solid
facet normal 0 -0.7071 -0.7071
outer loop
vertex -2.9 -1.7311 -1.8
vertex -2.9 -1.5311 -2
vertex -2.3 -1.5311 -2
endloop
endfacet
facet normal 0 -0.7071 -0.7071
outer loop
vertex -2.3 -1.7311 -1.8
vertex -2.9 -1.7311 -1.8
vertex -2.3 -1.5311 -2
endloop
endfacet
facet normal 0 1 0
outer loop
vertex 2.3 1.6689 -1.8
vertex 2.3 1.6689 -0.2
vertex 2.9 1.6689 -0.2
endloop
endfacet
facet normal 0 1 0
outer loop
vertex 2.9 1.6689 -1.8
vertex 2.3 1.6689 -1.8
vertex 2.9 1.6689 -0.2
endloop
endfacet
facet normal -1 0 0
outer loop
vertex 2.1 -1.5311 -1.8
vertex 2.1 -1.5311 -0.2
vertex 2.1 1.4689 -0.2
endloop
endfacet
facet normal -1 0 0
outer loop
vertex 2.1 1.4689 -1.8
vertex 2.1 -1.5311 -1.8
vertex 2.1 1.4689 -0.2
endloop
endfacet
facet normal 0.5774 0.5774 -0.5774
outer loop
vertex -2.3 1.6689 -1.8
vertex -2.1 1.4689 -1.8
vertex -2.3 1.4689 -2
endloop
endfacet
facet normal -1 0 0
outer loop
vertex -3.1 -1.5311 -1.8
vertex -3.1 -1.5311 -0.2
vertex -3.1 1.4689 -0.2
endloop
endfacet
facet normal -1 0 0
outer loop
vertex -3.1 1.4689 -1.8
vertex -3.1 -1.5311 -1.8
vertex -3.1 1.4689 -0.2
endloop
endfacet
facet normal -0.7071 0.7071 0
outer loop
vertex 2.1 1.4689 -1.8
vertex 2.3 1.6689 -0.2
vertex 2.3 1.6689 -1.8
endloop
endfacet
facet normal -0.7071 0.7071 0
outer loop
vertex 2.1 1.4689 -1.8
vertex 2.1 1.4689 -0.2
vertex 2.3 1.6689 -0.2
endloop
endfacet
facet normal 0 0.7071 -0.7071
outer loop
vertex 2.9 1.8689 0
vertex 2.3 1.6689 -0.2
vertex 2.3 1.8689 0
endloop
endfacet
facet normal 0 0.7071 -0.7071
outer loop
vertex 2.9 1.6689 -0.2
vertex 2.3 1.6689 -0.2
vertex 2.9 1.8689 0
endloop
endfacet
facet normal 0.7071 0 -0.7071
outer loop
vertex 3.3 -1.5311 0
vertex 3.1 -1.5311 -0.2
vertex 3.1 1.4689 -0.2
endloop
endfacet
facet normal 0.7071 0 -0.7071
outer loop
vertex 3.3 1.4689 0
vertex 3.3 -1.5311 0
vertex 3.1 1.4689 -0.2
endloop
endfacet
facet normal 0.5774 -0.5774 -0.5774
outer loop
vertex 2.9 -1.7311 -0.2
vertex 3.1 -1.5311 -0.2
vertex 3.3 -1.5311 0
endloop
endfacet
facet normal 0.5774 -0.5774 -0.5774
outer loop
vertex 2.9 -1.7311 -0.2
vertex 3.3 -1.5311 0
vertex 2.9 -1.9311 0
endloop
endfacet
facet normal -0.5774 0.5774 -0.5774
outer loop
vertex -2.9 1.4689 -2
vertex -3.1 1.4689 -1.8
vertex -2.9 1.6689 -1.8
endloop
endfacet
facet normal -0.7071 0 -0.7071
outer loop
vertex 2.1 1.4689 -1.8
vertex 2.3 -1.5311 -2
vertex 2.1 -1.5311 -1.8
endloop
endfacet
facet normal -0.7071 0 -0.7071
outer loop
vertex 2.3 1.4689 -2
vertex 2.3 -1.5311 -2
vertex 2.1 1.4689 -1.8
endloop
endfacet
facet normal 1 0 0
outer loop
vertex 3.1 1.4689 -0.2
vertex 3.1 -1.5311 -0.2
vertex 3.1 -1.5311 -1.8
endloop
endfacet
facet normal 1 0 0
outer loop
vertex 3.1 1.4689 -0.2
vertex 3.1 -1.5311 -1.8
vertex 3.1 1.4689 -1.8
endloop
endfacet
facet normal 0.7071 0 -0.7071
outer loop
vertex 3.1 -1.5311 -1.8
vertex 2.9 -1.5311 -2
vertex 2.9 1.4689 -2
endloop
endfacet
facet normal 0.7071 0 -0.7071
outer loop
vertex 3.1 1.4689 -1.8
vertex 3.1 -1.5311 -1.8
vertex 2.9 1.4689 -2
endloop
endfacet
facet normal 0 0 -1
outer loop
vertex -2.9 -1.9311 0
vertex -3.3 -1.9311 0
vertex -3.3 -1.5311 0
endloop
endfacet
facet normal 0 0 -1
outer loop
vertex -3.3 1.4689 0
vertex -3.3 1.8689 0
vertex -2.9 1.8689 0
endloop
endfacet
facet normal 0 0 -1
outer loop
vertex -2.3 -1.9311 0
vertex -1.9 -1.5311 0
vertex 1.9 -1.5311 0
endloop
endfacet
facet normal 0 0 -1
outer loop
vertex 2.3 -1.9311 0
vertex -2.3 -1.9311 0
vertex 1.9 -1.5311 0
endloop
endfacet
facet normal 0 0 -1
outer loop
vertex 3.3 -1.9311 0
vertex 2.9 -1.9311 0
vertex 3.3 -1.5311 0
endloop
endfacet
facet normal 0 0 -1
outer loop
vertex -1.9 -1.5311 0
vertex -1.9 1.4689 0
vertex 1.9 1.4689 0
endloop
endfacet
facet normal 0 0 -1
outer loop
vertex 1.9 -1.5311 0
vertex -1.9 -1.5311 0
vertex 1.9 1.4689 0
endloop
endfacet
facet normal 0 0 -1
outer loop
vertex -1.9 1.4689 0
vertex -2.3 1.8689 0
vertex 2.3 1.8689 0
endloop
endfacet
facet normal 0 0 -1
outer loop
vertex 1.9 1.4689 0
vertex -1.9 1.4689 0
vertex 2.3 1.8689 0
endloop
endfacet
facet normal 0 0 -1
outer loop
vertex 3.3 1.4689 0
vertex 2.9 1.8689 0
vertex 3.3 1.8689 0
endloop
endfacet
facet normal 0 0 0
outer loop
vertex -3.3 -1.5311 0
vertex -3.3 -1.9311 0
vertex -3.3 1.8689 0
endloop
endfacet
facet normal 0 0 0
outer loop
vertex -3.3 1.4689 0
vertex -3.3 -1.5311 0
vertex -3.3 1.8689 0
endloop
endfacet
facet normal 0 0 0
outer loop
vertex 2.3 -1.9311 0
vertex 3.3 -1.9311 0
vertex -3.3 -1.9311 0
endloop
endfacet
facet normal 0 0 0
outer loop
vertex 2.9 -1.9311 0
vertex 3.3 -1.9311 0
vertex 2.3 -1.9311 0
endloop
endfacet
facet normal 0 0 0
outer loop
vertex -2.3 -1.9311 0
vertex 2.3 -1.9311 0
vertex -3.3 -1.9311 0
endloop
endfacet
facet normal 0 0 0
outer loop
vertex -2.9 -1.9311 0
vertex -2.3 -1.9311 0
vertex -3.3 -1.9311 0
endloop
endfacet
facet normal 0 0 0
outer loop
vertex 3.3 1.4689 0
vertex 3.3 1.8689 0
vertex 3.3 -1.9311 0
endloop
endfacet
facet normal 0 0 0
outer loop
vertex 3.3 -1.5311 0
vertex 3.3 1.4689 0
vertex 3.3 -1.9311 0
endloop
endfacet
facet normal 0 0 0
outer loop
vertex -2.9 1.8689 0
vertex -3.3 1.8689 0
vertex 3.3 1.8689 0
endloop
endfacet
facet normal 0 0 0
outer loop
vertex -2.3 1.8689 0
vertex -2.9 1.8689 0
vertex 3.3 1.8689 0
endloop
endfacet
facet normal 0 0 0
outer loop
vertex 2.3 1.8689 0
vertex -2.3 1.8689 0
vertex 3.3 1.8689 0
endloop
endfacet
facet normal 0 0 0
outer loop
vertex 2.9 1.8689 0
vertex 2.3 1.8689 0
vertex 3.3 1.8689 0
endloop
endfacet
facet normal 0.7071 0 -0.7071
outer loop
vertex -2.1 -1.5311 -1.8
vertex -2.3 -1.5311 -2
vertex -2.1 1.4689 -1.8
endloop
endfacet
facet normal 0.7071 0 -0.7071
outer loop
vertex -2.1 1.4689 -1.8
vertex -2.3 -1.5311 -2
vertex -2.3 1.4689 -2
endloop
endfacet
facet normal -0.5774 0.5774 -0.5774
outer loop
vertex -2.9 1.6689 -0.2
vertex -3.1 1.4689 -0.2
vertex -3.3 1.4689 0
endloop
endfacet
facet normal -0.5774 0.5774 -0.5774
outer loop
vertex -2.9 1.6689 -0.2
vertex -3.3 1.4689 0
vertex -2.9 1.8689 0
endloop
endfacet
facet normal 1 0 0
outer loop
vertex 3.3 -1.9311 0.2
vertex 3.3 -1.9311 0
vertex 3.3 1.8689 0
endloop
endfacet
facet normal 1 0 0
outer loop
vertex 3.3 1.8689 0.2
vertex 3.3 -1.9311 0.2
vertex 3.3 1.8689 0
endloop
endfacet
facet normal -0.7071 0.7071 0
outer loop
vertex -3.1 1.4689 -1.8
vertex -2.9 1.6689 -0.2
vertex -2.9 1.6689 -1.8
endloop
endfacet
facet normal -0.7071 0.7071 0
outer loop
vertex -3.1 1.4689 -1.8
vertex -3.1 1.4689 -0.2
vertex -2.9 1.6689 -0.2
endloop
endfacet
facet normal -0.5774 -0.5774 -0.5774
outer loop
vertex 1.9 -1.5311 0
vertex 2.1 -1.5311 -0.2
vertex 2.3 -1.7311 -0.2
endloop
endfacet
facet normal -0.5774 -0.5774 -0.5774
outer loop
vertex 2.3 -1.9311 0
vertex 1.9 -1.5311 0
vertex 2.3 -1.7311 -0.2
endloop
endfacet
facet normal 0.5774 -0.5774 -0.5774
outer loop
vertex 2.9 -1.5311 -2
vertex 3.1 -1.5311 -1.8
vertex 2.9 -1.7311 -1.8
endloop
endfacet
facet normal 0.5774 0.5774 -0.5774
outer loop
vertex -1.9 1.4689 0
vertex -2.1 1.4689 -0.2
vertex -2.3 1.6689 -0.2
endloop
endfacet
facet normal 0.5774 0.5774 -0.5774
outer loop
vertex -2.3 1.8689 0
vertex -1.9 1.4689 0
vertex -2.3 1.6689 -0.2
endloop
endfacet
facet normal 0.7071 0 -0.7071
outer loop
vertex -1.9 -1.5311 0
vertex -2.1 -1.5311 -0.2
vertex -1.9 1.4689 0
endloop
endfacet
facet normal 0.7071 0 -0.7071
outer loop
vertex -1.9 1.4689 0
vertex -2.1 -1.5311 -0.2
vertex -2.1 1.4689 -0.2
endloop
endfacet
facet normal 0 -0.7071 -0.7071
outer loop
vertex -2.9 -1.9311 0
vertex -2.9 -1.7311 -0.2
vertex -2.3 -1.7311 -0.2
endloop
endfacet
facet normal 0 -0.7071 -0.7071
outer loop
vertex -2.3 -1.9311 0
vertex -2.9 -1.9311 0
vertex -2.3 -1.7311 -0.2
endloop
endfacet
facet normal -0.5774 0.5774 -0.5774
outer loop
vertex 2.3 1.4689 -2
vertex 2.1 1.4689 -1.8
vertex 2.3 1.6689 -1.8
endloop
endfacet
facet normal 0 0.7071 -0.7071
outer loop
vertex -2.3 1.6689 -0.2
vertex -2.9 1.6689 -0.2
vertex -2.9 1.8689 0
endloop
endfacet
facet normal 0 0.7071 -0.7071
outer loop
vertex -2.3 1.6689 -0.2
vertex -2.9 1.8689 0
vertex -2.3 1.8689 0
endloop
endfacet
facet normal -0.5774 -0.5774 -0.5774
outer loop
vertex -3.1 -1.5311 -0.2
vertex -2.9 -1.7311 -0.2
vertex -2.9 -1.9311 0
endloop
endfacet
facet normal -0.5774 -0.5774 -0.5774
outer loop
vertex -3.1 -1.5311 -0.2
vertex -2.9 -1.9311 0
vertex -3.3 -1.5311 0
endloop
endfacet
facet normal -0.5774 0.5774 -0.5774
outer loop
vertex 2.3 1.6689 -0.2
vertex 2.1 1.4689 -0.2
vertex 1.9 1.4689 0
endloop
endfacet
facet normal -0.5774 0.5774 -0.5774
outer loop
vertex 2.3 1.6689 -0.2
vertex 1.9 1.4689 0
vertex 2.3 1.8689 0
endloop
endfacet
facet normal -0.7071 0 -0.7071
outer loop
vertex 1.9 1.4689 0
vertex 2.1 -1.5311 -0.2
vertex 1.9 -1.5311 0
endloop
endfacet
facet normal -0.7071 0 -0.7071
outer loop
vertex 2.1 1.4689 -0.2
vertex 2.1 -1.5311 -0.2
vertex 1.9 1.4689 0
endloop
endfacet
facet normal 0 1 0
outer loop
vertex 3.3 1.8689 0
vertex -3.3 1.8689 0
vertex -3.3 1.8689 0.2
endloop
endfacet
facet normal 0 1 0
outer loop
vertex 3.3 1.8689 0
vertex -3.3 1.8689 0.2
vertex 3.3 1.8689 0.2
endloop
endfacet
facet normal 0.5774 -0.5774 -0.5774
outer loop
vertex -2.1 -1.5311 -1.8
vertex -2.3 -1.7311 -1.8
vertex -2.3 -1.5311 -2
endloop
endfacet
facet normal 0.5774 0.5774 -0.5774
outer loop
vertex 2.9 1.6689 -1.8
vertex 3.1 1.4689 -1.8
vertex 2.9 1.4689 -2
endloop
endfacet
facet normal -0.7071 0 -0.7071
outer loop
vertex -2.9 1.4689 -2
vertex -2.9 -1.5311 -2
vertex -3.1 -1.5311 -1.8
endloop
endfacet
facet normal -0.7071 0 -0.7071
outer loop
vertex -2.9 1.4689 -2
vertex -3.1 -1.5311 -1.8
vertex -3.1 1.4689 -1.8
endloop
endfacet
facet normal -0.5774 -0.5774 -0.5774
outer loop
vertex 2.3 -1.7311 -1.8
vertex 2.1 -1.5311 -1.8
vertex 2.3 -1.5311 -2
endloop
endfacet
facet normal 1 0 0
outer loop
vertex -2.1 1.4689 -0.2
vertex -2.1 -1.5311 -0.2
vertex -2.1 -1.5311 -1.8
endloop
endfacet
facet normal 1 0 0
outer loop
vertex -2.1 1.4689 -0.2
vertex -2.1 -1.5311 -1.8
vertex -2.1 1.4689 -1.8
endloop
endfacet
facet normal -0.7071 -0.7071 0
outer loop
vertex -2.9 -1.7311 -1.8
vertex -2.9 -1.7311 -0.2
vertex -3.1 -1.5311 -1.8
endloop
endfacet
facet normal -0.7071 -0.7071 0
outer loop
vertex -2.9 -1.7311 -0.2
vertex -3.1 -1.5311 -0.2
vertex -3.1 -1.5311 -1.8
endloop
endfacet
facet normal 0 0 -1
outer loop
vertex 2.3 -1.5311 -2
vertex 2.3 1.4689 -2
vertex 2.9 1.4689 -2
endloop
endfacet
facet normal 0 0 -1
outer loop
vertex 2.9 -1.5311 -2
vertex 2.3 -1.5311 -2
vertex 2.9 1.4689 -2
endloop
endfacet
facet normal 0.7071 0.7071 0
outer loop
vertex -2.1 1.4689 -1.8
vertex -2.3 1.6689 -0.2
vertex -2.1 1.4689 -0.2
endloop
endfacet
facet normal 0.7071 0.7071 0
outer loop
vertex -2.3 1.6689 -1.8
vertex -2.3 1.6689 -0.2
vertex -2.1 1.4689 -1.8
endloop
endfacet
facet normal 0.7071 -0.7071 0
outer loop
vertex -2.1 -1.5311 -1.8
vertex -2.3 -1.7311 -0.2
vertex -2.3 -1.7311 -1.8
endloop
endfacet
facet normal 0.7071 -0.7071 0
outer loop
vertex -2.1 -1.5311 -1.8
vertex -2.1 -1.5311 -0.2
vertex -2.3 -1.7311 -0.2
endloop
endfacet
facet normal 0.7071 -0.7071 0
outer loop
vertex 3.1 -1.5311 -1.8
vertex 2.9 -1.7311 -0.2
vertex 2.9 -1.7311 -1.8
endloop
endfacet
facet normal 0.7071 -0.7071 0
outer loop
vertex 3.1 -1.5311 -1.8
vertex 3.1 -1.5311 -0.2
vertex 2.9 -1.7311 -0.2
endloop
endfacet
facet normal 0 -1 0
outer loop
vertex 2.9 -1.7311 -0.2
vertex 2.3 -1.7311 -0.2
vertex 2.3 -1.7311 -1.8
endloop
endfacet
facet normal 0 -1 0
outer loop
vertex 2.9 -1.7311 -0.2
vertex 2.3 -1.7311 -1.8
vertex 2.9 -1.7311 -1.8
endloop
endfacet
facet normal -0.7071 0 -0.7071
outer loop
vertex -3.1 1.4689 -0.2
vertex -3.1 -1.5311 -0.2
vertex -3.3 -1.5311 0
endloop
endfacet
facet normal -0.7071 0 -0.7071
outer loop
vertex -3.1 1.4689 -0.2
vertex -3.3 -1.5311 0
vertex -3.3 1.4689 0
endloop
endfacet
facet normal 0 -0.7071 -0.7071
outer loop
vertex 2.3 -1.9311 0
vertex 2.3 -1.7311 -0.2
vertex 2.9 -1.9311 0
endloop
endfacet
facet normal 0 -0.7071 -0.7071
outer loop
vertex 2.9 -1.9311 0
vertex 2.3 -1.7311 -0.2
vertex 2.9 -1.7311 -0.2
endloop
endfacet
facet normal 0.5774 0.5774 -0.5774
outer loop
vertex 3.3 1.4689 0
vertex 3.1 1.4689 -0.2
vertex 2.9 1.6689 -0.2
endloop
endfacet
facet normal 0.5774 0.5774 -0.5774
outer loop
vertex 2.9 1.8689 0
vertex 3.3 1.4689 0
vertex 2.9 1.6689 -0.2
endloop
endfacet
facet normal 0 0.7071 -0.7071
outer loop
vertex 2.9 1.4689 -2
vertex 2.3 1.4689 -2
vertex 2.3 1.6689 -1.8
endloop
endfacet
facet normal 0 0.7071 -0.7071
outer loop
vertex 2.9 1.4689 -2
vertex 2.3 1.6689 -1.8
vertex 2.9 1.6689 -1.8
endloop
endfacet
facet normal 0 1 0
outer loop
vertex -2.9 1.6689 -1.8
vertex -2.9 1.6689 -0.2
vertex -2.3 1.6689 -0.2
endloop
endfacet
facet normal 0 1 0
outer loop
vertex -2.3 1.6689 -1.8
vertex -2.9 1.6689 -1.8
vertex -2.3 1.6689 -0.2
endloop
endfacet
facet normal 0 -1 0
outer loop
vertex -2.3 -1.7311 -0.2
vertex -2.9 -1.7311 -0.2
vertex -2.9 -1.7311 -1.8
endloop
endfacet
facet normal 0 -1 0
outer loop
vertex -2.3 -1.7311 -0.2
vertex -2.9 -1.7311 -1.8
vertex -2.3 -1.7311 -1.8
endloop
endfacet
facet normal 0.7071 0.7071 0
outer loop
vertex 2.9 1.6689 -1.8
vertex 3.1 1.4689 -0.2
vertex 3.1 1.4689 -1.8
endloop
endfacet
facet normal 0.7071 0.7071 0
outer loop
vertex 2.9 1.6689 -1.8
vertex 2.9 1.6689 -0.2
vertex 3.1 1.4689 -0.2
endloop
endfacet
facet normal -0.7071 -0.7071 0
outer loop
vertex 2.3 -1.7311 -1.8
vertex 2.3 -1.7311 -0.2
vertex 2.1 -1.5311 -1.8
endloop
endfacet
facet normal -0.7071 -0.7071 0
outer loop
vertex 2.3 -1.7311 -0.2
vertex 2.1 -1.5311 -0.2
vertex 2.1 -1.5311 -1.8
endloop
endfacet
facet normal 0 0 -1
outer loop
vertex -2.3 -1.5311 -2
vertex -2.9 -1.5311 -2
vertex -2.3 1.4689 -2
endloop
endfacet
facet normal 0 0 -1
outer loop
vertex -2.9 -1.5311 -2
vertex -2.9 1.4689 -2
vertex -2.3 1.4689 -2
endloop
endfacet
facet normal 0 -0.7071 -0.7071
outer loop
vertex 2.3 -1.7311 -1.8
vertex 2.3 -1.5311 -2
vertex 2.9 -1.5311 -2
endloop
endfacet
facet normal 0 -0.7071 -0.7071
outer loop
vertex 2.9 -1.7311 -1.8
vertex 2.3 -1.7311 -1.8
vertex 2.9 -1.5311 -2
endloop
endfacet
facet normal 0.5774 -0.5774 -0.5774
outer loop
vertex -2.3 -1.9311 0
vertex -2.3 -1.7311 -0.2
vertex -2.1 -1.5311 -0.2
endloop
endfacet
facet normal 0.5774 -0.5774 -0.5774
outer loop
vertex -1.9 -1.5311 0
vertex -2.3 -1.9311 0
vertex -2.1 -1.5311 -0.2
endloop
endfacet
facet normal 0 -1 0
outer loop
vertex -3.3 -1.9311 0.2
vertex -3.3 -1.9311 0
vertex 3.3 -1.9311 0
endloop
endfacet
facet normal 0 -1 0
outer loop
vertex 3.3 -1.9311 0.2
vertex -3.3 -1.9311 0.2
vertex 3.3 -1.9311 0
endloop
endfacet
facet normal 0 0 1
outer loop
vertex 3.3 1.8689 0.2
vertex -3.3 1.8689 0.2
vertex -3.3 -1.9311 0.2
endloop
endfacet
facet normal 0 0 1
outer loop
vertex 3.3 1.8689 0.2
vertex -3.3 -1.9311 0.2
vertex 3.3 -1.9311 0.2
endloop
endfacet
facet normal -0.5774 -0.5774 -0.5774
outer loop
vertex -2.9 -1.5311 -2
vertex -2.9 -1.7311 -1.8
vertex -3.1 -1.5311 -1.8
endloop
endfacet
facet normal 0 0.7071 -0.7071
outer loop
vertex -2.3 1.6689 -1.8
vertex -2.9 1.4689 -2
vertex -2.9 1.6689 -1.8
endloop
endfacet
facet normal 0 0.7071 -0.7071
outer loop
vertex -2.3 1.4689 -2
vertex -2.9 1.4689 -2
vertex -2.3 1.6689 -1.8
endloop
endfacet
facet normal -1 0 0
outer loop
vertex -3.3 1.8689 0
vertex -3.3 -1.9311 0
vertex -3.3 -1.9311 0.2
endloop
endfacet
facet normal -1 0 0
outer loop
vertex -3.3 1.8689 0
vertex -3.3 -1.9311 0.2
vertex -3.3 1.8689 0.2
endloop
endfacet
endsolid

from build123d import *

# Parameters (mm, degrees)
F1_W     = 6.6
F1_H     = 3.8
F1_W_2   = 1
F1_H_2   = 3.4
F3_DEPTH = 0.2
F4_DEPTH = 2
F5_SIZE  = 0.19999


# Not quite as in the source:
# - a fillet or chamfer is up to 0.001 mm smaller than in the source, because OpenCascade refuses the exact size
# - a feature names something its author has since deleted; it is built from what else it names


with BuildPart() as f3:
    # F1 (on Top) → F3 (new body)
    with BuildSketch(Plane.XY):
        with Locations((0, -0.0311205854)):
            Rectangle(F1_W, F1_H)
        with Locations((-2.6, -0.0311205854)):
            Rectangle(F1_W_2, F1_H_2, mode=Mode.SUBTRACT)
        with Locations((2.6, -0.0311205854)):
            Rectangle(F1_W_2, F1_H_2, mode=Mode.SUBTRACT)
        with Locations((-2.6, -0.0311205854)):
            Rectangle(F1_W_2, F1_H_2)
        with Locations((2.6, -0.0311205854)):
            Rectangle(F1_W_2, F1_H_2)
    extrude(amount=F3_DEPTH)

    # F1 (on Top) → F4 (join, through all)
    with BuildSketch(Plane.XY):
        with Locations((-2.6, -0.0311205854)):
            Rectangle(F1_W_2, F1_H_2)
        with Locations((2.6, -0.0311205854)):
            Rectangle(F1_W_2, F1_H_2)
    extrude(amount=-F4_DEPTH)

    # F5 (size 0.2 in the source; OpenCascade refuses exactly that, so slightly less here)
    f5_edges = [f3.edges().sort_by_distance(p)[0] for p in [
        (-3.1, -1.731121, -1),
        (-2.1, -1.731121, -1),
        (-2.6, -1.731121, 0),
        (-2.6, -1.731121, -2),
        (-3.1, 1.668879, -1),
        (-3.1, -0.031121, 0),
        (-3.1, -0.031121, -2),
        (-2.1, 1.668879, -1),
        (-2.1, -0.031121, 0),
        (-2.1, -0.031121, -2),
        (-2.6, 1.668879, 0),
        (-2.6, 1.668879, -2),
        (3.1, -1.731121, -1),
        (3.1, 1.668879, -1),
        (3.1, -0.031121, 0),
        (3.1, -0.031121, -2),
        (2.1, 1.668879, -1),
        (2.1, -1.731121, -1),
        (2.1, -0.031121, 0),
        (2.1, -0.031121, -2),
        (2.6, -1.731121, 0),
        (2.6, -1.731121, -2),
        (2.6, 1.668879, 0),
        (2.6, 1.668879, -2),
    ]]
    chamfer(f5_edges, length=F5_SIZE)


solid = f3.part
